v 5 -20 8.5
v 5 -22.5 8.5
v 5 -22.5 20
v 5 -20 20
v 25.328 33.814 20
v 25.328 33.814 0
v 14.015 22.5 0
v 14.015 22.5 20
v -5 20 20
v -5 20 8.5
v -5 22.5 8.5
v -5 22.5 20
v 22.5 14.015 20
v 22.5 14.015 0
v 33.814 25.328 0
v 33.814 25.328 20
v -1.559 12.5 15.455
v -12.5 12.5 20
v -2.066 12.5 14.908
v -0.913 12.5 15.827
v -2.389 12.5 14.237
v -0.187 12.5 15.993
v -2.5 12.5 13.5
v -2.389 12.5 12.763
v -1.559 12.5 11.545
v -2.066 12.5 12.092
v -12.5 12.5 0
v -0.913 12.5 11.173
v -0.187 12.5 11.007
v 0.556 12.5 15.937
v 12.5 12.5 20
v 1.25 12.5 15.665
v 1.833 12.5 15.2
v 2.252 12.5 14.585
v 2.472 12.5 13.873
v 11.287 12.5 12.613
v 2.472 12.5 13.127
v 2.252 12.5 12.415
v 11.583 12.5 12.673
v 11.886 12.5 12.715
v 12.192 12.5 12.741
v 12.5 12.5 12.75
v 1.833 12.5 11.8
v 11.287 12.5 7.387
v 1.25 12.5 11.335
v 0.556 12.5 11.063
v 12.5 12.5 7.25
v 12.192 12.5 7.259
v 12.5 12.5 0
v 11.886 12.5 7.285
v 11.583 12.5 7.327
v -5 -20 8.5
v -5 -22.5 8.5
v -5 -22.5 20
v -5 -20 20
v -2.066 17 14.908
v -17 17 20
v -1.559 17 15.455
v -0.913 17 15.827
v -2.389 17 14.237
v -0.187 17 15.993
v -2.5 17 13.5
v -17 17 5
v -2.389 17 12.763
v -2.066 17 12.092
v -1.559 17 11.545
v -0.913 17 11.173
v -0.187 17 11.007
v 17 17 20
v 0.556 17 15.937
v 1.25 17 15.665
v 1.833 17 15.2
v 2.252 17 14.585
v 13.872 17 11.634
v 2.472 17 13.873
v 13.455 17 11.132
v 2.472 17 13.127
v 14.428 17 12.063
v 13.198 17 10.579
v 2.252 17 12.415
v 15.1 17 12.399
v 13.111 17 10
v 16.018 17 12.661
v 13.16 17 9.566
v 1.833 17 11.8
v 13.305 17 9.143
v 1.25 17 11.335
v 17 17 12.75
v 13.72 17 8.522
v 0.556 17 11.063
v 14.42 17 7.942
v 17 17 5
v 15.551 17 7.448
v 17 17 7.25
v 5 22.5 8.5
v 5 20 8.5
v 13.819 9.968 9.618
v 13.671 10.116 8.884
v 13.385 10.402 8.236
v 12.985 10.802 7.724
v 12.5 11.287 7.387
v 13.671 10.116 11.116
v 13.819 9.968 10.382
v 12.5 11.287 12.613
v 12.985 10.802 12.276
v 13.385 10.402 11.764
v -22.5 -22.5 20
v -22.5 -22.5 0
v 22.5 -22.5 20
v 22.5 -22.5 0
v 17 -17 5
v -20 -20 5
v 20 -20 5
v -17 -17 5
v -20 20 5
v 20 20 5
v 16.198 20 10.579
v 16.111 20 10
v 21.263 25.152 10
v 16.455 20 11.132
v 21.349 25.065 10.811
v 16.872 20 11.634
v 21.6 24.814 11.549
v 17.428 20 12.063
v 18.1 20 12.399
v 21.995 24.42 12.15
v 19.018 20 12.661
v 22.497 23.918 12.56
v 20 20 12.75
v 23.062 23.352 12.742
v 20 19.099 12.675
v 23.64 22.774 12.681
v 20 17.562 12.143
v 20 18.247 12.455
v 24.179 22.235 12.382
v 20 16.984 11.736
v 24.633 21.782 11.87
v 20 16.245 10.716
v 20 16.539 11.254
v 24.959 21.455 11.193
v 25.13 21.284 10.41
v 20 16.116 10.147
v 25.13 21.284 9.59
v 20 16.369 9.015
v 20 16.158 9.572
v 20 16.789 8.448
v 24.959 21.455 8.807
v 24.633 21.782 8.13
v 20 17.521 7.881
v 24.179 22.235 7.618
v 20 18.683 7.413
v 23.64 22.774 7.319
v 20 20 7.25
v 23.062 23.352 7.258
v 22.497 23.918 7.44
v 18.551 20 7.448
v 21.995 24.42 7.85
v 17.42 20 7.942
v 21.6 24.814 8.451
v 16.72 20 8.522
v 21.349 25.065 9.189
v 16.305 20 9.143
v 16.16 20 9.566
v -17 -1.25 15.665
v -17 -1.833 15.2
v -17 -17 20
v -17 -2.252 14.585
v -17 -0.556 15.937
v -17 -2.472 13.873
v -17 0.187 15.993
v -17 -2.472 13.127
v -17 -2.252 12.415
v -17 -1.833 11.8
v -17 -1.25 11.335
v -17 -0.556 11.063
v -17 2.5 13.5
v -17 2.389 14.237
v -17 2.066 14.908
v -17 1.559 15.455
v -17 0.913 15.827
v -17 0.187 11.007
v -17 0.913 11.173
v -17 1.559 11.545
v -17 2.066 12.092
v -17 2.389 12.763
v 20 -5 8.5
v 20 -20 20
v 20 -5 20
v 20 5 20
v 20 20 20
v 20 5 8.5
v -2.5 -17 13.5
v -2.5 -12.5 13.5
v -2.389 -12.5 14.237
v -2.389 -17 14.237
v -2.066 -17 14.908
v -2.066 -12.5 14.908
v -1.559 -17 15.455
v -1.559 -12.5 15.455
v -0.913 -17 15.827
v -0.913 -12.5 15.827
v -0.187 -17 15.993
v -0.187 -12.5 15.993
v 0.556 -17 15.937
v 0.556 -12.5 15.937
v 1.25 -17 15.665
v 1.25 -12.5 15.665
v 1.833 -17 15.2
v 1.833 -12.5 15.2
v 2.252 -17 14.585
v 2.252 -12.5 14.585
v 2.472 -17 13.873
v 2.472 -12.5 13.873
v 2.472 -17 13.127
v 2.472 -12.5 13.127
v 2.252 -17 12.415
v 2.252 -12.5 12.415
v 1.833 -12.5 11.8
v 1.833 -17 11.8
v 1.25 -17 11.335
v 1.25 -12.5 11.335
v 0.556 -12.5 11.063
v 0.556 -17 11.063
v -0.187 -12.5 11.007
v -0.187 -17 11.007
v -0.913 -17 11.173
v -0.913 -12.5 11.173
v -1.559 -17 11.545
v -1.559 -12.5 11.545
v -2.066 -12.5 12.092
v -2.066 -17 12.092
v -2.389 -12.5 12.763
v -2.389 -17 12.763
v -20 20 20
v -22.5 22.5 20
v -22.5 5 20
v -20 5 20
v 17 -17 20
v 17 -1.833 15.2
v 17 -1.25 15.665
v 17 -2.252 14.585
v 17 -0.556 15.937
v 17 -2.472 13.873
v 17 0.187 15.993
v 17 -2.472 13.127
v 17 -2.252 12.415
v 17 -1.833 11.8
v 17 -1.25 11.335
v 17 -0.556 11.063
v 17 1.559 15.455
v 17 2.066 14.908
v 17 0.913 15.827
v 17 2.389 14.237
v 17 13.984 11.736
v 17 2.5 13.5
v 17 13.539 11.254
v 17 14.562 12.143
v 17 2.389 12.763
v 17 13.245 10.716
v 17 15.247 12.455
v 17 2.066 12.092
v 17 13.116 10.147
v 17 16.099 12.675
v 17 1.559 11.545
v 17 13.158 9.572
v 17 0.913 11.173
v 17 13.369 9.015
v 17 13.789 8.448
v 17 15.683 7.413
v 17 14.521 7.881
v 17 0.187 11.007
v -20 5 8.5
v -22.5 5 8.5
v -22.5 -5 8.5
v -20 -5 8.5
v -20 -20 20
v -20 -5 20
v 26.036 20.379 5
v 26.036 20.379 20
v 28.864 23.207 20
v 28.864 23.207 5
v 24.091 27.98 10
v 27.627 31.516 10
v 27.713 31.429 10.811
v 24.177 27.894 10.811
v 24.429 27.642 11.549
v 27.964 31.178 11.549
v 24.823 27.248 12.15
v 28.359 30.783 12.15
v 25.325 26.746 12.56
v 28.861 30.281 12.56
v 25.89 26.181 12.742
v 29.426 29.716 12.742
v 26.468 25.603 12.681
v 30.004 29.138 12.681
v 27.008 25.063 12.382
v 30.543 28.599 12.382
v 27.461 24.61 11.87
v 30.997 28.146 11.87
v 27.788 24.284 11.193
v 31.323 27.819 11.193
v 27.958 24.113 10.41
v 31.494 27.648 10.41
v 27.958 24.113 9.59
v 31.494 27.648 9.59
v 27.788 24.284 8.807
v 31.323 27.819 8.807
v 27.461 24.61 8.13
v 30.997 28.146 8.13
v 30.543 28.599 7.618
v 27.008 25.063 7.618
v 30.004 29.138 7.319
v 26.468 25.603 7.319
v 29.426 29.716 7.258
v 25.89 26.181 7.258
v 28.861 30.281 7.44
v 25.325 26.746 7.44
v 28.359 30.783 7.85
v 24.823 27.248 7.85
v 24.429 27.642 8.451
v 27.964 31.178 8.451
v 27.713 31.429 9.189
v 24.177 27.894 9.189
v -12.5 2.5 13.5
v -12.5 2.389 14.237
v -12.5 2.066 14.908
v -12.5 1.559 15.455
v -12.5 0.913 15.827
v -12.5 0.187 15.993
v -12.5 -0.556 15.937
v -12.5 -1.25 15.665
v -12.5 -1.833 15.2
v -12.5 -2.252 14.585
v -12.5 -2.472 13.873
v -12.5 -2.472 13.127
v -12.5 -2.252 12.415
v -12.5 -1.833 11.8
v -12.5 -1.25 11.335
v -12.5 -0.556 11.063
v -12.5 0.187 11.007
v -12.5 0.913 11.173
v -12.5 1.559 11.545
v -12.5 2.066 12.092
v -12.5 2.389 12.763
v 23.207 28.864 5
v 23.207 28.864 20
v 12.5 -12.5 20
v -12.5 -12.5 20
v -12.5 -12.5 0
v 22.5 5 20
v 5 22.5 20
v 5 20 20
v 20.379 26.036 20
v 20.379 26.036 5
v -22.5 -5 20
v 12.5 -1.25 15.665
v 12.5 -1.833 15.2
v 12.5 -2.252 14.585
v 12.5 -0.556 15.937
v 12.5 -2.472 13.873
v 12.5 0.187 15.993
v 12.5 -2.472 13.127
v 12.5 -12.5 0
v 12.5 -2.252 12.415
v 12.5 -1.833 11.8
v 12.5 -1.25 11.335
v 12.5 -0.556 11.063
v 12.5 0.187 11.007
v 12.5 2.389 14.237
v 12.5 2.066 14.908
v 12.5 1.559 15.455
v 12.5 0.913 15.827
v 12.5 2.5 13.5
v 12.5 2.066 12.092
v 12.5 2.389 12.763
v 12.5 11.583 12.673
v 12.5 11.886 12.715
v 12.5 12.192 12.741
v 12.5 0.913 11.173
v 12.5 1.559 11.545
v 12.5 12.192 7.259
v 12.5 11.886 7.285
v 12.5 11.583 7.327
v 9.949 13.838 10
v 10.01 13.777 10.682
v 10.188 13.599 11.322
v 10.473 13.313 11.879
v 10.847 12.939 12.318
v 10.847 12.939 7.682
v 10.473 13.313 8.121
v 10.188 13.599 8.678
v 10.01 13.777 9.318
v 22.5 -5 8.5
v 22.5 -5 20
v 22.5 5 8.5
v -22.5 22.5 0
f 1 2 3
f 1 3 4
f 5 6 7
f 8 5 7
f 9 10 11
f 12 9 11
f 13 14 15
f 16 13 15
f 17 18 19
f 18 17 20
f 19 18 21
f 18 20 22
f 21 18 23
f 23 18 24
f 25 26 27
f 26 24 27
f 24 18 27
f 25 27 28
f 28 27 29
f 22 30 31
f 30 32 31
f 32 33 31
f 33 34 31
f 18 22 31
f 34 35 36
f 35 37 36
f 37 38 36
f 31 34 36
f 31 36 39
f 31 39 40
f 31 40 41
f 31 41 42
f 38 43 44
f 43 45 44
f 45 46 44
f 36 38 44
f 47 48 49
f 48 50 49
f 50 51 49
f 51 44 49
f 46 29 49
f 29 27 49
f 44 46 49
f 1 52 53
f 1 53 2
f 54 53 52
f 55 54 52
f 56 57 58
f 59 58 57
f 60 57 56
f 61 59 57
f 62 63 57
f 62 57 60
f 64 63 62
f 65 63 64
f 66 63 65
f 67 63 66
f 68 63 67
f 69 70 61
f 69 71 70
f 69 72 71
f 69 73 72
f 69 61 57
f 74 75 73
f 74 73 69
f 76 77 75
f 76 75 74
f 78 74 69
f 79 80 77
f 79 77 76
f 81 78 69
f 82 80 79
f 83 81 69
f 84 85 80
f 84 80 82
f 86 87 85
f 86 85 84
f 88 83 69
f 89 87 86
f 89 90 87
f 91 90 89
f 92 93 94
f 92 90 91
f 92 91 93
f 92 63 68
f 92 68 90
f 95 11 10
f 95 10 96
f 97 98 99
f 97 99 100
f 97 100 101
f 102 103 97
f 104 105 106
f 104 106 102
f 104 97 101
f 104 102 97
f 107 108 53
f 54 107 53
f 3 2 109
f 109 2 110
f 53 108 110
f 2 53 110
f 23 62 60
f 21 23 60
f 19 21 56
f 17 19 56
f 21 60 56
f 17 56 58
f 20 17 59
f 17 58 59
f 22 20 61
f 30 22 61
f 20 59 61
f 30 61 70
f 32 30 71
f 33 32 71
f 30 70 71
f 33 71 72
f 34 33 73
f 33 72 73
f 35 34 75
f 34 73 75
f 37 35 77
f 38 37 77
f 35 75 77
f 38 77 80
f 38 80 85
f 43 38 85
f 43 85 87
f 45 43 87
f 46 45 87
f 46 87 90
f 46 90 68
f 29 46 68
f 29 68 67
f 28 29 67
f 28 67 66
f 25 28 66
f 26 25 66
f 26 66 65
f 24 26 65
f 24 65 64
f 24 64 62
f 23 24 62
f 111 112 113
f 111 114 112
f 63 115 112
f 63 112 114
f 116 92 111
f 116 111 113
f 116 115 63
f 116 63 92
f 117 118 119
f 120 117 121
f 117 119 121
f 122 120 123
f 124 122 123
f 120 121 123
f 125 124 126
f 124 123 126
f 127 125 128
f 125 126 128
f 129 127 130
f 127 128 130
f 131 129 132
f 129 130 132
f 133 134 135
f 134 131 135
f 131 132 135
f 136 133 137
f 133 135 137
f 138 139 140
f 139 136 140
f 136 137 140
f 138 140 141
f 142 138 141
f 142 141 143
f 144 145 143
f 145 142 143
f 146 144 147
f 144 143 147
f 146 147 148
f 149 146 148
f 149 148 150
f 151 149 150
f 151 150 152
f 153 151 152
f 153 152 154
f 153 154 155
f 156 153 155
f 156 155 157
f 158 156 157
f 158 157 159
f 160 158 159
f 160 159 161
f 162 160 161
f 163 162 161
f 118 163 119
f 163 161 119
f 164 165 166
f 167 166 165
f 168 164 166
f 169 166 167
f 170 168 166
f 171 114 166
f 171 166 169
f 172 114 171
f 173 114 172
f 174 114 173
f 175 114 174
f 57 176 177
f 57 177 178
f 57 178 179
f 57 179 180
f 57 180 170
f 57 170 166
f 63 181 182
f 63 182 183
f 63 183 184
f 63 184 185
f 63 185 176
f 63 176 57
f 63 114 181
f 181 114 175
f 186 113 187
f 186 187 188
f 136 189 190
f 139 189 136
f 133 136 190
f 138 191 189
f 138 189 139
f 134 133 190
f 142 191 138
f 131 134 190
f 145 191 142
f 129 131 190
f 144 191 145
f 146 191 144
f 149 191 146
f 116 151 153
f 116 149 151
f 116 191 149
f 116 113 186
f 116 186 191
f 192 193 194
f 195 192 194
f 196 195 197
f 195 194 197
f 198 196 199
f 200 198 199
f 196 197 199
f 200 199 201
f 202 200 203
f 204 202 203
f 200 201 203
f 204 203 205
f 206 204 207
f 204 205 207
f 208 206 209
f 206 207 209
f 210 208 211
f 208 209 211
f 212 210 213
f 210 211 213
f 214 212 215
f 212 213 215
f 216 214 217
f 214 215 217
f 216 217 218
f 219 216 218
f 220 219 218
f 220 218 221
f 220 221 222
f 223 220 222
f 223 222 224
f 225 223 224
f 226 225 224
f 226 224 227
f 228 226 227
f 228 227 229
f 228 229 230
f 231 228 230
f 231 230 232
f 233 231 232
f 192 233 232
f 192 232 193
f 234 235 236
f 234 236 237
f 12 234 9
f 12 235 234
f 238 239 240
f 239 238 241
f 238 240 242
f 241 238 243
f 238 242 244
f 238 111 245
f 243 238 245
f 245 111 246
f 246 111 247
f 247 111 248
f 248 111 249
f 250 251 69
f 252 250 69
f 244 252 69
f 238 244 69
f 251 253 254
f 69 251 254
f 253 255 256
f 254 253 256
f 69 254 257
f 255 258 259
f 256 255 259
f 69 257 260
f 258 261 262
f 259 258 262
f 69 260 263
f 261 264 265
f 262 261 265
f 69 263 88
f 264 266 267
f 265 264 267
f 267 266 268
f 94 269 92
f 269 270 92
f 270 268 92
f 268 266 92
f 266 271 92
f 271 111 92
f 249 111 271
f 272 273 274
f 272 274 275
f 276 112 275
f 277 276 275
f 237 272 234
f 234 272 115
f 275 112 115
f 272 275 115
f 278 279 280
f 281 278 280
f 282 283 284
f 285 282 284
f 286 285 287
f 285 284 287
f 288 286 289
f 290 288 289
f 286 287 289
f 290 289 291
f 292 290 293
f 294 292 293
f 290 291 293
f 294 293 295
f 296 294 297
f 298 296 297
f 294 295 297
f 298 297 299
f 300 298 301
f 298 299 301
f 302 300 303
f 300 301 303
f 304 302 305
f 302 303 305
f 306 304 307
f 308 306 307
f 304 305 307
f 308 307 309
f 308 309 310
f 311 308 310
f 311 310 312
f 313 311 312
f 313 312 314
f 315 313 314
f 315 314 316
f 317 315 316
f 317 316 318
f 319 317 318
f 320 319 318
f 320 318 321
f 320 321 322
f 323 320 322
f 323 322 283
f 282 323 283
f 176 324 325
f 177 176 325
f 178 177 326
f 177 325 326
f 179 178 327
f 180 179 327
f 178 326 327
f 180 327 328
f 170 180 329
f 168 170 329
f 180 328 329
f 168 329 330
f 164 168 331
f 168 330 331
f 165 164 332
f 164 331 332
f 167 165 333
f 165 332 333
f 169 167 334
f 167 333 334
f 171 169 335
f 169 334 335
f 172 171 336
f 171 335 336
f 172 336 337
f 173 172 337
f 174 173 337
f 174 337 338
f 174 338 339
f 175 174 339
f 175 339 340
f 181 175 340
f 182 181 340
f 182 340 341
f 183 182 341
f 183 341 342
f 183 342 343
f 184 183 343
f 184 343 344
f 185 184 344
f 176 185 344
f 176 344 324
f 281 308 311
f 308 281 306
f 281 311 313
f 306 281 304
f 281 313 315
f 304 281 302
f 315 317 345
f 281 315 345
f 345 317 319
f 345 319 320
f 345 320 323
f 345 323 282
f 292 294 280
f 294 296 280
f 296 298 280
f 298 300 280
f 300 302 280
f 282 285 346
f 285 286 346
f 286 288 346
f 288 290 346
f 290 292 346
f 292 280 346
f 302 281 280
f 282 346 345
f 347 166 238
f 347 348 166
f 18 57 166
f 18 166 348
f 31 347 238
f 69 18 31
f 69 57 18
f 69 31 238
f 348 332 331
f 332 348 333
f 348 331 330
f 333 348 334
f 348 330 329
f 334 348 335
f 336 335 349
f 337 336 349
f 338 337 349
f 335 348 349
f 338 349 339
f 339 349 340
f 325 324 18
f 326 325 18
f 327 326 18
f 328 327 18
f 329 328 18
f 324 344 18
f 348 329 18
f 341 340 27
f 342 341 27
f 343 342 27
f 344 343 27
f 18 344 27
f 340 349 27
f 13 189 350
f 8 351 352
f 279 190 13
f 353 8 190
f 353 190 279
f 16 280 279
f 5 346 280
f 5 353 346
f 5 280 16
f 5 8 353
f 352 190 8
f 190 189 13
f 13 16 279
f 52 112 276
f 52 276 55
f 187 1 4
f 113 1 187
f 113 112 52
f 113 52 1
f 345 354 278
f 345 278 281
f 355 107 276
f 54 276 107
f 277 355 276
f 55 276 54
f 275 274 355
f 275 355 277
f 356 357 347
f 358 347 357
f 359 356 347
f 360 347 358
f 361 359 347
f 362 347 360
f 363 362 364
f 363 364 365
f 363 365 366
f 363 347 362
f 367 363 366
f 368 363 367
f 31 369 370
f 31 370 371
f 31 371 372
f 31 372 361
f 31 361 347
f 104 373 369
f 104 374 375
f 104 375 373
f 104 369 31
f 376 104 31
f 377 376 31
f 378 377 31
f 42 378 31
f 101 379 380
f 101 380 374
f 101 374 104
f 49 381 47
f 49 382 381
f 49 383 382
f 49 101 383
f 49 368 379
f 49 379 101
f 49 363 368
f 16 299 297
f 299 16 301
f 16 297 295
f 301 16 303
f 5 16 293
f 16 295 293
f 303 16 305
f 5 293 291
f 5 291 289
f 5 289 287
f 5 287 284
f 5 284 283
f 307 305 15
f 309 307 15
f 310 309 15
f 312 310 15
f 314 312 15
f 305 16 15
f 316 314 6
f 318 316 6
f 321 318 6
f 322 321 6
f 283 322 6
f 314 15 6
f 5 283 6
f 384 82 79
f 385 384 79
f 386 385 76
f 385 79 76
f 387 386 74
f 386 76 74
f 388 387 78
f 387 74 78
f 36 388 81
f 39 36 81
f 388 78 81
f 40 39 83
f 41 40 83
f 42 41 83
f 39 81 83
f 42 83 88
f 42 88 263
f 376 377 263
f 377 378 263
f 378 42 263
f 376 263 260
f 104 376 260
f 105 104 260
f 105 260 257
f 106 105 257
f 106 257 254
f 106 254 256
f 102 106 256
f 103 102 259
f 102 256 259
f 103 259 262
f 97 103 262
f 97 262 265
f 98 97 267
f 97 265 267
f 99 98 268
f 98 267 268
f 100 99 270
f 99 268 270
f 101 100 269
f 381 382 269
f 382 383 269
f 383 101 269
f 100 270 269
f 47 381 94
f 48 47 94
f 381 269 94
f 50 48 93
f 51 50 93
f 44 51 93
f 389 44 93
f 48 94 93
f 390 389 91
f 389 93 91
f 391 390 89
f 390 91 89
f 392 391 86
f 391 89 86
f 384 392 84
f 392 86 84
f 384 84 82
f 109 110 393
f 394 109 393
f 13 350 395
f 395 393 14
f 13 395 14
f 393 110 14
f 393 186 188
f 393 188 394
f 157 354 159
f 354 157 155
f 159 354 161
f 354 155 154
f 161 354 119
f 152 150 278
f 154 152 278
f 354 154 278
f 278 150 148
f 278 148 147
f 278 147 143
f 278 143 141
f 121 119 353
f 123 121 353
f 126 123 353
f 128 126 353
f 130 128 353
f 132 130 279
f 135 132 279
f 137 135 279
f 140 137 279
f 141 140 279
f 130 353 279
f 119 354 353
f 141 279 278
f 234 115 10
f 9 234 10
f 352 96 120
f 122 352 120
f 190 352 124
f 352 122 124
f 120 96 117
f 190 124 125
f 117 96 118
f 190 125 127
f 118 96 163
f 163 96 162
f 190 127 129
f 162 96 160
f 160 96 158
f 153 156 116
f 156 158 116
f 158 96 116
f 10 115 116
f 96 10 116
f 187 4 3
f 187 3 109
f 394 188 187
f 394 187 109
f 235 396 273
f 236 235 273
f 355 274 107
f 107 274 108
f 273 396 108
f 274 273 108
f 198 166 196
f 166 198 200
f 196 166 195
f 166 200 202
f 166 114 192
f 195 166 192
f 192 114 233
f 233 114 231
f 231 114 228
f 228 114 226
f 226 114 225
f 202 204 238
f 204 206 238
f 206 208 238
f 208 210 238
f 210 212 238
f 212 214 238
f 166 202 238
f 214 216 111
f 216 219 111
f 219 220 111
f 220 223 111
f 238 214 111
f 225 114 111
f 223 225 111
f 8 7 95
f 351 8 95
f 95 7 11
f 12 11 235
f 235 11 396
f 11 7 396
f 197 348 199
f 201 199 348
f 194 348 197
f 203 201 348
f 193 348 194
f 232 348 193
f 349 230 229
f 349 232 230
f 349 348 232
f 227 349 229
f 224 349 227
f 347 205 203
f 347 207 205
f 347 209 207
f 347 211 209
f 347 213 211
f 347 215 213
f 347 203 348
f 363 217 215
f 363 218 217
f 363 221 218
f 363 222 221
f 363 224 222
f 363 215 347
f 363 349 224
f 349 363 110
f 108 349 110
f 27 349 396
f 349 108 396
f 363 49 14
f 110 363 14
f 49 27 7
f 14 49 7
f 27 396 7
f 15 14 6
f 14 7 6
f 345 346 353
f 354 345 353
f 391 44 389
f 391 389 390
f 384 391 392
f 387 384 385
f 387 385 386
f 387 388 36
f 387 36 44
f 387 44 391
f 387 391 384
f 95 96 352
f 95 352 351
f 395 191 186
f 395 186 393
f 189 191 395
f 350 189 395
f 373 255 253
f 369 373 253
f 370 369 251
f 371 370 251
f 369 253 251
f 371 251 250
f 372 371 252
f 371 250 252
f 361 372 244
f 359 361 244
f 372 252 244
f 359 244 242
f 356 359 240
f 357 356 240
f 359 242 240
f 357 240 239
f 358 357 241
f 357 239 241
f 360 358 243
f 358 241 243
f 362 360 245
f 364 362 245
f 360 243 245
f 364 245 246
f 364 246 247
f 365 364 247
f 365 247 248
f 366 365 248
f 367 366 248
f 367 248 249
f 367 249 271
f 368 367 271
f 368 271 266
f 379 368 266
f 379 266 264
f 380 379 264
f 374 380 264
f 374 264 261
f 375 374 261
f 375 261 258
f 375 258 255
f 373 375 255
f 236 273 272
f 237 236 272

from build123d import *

# Parameters (mm, degrees)
F0_W      = 25
F0_H      = 25
F1_DEPTH  = 5
F2_W      = 34
F2_H      = 34
F2_W_2    = 25
F2_H_2    = 25
F3_DEPTH  = 15
F4_W      = 40
F4_H      = 40
F5_DEPTH  = 15
F6_W      = 10
F6_H      = 2.5
F6_W_2    = 2.5
F6_H_2    = 10
F7_DEPTH  = 11.5
F8_R      = 2.75
F9_DEPTH  = 25
F11_DEPTH = 15
F12_R     = 2.5
F13_DEPTH = 45
F14_R     = 2.5
F15_DEPTH = 45


with BuildPart() as f1:
    # F0 (on Top) → F1 (new body)
    with BuildSketch(Plane.XY):
        Polygon((22.5, 14.0147186258), (22.5, 22.5), (14.0147186258, 22.5), (-22.5, 22.5), (-22.5, -22.5), (22.5, -22.5), align=None)
        Rectangle(F0_W, F0_H, mode=Mode.SUBTRACT)
        Polygon((14.0147186258, 22.5), (22.5, 22.5), (22.5, 14.0147186258), (33.813708499, 25.3284271247), (25.3284271247, 33.813708499), align=None)
    extrude(amount=F1_DEPTH)

    # F2 (on face) → F3 (join)
    with BuildSketch(Plane.XY.offset(5)):
        Rectangle(F2_W, F2_H)
        Rectangle(F2_W_2, F2_H_2, mode=Mode.SUBTRACT)
    extrude(amount=F3_DEPTH)

    # F4 (on face) → F5 (join)
    with BuildSketch(Plane.XY.offset(5)):
        Polygon((25.3284271247, 33.813708499), (14.0147186258, 22.5), (-22.5, 22.5), (-22.5, -22.5), (22.5, -22.5), (22.5, 14.0147186258), (33.813708499, 25.3284271247), align=None)
        Rectangle(F4_W, F4_H, mode=Mode.SUBTRACT)
    extrude(amount=F5_DEPTH)

    # F6 (on face) → F7 (cut)
    with BuildSketch(Plane.XY.offset(20)):
        with Locations((0, 21.25)):
            Rectangle(F6_W, F6_H)
        with Locations((-21.25, 0)):
            Rectangle(F6_W_2, F6_H_2)
        with Locations((21.25, 0)):
            Rectangle(F6_W_2, F6_H_2)
        with Locations((0, -21.25)):
            Rectangle(F6_W, F6_H)
    extrude(amount=-F7_DEPTH, mode=Mode.SUBTRACT)

    # F8 (on face) → F9 (cut)
    with BuildSketch(Plane(origin=(29.5710678119, 29.5710678119, 0), x_dir=(-0.7071067812, 0.7071067812, 0), z_dir=(0.7071067812, 0.7071067812, 0))):
        with Locations((0, 10)):
            Circle(F8_R)
    extrude(amount=-F9_DEPTH, mode=Mode.SUBTRACT)

    # F10 (on face) → F11 (cut)
    with BuildSketch(Plane.XY.offset(20)):
        Polygon((28.8639610307, 23.2071067812), (23.2071067812, 28.8639610307), (20.3786796564, 26.0355339059), (26.0355339059, 20.3786796564), align=None)
    extrude(amount=-F11_DEPTH, mode=Mode.SUBTRACT)

    # F12 (on face) → F13 (cut)
    with BuildSketch(Plane(origin=(0, 17, 0), x_dir=(-1, 0, 0), z_dir=(0, 1, 0))):
        with Locations((0, 13.5)):
            Circle(F12_R)
    extrude(amount=-F13_DEPTH, mode=Mode.SUBTRACT)

    # F14 (on face) → F15 (cut)
    with BuildSketch(Plane.YZ.offset(17)):
        with Locations((0, 13.5)):
            Circle(F14_R)
    extrude(amount=-F15_DEPTH, mode=Mode.SUBTRACT)


solid = f1.part
